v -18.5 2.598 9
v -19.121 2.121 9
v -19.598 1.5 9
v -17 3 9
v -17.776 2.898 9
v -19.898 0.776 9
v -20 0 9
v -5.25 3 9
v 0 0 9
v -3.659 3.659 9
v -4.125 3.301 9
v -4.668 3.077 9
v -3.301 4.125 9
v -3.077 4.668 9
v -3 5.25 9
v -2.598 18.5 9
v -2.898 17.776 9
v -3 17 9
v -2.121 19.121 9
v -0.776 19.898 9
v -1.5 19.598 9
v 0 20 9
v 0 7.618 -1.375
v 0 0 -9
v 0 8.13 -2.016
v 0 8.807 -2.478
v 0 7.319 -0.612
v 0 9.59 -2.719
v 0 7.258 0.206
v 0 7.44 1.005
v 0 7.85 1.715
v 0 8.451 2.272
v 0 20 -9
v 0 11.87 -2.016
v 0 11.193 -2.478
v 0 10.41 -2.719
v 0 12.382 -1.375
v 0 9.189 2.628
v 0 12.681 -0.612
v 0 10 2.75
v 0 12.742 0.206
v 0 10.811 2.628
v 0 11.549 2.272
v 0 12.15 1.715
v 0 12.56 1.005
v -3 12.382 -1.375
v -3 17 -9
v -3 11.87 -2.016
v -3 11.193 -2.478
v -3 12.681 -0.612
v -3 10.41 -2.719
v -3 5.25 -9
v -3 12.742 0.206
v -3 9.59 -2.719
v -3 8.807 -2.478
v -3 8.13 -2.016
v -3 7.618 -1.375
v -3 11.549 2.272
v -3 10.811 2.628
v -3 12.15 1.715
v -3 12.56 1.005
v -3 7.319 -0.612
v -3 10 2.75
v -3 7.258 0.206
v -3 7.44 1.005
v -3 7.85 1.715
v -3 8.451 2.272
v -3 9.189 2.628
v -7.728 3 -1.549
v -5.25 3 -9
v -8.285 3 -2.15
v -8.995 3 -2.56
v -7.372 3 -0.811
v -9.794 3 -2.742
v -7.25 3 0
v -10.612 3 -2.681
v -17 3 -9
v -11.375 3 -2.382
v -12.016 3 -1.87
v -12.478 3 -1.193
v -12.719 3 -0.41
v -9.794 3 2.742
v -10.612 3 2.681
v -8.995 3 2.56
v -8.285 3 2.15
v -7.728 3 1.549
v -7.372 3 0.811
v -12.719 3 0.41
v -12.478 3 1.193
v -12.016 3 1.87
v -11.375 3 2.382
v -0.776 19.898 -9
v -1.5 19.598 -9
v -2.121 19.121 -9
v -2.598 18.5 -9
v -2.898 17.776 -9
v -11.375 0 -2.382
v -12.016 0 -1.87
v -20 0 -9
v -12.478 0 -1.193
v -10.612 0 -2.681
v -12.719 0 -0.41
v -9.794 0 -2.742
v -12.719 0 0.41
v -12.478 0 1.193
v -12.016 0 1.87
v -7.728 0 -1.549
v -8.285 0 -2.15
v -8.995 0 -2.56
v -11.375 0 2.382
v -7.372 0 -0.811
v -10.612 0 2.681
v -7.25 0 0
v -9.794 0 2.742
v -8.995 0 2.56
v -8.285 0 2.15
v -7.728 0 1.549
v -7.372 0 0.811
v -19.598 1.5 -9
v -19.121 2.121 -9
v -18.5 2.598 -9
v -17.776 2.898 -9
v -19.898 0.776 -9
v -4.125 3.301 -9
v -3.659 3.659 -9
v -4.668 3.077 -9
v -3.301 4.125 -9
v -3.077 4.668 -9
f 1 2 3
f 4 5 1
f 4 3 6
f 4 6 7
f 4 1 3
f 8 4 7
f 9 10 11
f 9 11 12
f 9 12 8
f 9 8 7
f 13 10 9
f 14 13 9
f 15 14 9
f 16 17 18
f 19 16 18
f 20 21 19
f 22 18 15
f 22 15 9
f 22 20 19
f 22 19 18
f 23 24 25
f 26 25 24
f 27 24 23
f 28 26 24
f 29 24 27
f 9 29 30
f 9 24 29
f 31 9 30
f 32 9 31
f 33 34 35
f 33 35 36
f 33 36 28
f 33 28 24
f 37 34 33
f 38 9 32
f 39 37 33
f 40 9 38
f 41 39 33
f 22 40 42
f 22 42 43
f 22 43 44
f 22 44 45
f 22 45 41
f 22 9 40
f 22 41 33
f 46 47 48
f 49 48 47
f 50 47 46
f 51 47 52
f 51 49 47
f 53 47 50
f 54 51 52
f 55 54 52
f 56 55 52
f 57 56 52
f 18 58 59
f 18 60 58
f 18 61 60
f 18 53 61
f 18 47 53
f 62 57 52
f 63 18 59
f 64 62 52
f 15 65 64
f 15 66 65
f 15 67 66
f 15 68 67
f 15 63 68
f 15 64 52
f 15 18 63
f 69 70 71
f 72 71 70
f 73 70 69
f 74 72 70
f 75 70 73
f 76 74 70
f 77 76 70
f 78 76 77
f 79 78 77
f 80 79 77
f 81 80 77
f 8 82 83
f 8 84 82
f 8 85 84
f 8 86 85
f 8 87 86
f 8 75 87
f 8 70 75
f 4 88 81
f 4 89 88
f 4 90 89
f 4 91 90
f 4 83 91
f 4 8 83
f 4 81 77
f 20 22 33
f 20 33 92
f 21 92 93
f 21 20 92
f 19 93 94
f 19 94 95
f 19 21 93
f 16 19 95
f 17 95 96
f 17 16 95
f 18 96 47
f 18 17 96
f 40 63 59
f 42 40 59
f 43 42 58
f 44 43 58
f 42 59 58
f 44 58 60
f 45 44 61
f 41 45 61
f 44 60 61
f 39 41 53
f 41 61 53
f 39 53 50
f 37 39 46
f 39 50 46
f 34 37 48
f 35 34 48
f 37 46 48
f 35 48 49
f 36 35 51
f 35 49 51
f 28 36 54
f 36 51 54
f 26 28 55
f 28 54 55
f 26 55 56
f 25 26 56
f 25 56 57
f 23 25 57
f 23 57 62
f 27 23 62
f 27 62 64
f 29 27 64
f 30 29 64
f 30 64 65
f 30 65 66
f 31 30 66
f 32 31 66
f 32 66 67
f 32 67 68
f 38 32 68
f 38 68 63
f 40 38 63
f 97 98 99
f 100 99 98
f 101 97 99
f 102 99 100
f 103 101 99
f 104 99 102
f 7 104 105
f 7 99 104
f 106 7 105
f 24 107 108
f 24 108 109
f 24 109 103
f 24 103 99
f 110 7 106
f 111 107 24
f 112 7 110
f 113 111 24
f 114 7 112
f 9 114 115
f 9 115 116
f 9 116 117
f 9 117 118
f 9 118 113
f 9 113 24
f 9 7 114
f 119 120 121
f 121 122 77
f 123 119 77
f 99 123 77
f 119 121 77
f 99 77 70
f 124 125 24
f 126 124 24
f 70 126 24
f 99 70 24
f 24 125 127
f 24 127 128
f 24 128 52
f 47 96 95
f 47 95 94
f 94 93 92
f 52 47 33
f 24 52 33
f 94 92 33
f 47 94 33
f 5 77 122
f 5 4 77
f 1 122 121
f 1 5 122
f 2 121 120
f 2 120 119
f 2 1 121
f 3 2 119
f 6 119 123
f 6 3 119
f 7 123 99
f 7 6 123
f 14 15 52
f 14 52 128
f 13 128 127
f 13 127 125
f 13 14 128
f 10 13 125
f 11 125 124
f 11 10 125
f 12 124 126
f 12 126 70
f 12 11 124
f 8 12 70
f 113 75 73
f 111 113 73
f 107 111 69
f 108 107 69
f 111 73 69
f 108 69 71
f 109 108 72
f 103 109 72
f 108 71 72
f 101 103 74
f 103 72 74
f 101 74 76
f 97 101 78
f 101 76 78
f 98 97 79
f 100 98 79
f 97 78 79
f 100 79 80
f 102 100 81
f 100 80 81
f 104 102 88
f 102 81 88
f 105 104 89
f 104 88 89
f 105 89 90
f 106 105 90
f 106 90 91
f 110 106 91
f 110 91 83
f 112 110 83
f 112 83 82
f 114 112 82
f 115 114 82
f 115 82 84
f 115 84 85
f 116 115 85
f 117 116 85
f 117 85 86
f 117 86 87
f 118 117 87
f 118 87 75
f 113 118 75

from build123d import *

# Parameters (mm, degrees)
EXTRUDE1_DEPTH     = 9
SKETCH2_R          = 2.75
CUT_EXTRUDE1_DEPTH = 4
SKETCH3_R          = 2.75
CUT_EXTRUDE2_DEPTH = 4


with BuildPart() as part:
    # Sketch1 → Extrude1 (new body, symmetric)
    with BuildSketch(Plane.XY):
        with BuildLine():
            Line((0, 0), (0, 20))
            ThreePointArc((0, 20), (-2.121320344, 19.121320344), (-3, 17))
            Line((-3, 17), (-3, 5.25))
            ThreePointArc((-3, 5.25), (-3.659009742, 3.659009742), (-5.25, 3))
            Line((-5.25, 3), (-17, 3))
            ThreePointArc((-17, 3), (-19.121320344, 2.121320344), (-20, 0))
            Line((-20, 0), (0, 0))
        make_face()
    extrude(amount=EXTRUDE1_DEPTH, both=True)

    # Sketch2 → Cut-Extrude1 (cut, through all)
    with BuildSketch(Plane(origin=(0, 3, 0), x_dir=(1, 0, 0), z_dir=(0, 1, 0))):
        with Locations((-10, 0)):
            Circle(SKETCH2_R)
    extrude(amount=-CUT_EXTRUDE1_DEPTH, mode=Mode.SUBTRACT)

    # Sketch3 → Cut-Extrude2 (cut, through all)
    with BuildSketch(Plane.ZY.offset(3)):
        with Locations((0, 10)):
            Circle(SKETCH3_R)
    extrude(amount=-CUT_EXTRUDE2_DEPTH, mode=Mode.SUBTRACT)


solid = part.part
